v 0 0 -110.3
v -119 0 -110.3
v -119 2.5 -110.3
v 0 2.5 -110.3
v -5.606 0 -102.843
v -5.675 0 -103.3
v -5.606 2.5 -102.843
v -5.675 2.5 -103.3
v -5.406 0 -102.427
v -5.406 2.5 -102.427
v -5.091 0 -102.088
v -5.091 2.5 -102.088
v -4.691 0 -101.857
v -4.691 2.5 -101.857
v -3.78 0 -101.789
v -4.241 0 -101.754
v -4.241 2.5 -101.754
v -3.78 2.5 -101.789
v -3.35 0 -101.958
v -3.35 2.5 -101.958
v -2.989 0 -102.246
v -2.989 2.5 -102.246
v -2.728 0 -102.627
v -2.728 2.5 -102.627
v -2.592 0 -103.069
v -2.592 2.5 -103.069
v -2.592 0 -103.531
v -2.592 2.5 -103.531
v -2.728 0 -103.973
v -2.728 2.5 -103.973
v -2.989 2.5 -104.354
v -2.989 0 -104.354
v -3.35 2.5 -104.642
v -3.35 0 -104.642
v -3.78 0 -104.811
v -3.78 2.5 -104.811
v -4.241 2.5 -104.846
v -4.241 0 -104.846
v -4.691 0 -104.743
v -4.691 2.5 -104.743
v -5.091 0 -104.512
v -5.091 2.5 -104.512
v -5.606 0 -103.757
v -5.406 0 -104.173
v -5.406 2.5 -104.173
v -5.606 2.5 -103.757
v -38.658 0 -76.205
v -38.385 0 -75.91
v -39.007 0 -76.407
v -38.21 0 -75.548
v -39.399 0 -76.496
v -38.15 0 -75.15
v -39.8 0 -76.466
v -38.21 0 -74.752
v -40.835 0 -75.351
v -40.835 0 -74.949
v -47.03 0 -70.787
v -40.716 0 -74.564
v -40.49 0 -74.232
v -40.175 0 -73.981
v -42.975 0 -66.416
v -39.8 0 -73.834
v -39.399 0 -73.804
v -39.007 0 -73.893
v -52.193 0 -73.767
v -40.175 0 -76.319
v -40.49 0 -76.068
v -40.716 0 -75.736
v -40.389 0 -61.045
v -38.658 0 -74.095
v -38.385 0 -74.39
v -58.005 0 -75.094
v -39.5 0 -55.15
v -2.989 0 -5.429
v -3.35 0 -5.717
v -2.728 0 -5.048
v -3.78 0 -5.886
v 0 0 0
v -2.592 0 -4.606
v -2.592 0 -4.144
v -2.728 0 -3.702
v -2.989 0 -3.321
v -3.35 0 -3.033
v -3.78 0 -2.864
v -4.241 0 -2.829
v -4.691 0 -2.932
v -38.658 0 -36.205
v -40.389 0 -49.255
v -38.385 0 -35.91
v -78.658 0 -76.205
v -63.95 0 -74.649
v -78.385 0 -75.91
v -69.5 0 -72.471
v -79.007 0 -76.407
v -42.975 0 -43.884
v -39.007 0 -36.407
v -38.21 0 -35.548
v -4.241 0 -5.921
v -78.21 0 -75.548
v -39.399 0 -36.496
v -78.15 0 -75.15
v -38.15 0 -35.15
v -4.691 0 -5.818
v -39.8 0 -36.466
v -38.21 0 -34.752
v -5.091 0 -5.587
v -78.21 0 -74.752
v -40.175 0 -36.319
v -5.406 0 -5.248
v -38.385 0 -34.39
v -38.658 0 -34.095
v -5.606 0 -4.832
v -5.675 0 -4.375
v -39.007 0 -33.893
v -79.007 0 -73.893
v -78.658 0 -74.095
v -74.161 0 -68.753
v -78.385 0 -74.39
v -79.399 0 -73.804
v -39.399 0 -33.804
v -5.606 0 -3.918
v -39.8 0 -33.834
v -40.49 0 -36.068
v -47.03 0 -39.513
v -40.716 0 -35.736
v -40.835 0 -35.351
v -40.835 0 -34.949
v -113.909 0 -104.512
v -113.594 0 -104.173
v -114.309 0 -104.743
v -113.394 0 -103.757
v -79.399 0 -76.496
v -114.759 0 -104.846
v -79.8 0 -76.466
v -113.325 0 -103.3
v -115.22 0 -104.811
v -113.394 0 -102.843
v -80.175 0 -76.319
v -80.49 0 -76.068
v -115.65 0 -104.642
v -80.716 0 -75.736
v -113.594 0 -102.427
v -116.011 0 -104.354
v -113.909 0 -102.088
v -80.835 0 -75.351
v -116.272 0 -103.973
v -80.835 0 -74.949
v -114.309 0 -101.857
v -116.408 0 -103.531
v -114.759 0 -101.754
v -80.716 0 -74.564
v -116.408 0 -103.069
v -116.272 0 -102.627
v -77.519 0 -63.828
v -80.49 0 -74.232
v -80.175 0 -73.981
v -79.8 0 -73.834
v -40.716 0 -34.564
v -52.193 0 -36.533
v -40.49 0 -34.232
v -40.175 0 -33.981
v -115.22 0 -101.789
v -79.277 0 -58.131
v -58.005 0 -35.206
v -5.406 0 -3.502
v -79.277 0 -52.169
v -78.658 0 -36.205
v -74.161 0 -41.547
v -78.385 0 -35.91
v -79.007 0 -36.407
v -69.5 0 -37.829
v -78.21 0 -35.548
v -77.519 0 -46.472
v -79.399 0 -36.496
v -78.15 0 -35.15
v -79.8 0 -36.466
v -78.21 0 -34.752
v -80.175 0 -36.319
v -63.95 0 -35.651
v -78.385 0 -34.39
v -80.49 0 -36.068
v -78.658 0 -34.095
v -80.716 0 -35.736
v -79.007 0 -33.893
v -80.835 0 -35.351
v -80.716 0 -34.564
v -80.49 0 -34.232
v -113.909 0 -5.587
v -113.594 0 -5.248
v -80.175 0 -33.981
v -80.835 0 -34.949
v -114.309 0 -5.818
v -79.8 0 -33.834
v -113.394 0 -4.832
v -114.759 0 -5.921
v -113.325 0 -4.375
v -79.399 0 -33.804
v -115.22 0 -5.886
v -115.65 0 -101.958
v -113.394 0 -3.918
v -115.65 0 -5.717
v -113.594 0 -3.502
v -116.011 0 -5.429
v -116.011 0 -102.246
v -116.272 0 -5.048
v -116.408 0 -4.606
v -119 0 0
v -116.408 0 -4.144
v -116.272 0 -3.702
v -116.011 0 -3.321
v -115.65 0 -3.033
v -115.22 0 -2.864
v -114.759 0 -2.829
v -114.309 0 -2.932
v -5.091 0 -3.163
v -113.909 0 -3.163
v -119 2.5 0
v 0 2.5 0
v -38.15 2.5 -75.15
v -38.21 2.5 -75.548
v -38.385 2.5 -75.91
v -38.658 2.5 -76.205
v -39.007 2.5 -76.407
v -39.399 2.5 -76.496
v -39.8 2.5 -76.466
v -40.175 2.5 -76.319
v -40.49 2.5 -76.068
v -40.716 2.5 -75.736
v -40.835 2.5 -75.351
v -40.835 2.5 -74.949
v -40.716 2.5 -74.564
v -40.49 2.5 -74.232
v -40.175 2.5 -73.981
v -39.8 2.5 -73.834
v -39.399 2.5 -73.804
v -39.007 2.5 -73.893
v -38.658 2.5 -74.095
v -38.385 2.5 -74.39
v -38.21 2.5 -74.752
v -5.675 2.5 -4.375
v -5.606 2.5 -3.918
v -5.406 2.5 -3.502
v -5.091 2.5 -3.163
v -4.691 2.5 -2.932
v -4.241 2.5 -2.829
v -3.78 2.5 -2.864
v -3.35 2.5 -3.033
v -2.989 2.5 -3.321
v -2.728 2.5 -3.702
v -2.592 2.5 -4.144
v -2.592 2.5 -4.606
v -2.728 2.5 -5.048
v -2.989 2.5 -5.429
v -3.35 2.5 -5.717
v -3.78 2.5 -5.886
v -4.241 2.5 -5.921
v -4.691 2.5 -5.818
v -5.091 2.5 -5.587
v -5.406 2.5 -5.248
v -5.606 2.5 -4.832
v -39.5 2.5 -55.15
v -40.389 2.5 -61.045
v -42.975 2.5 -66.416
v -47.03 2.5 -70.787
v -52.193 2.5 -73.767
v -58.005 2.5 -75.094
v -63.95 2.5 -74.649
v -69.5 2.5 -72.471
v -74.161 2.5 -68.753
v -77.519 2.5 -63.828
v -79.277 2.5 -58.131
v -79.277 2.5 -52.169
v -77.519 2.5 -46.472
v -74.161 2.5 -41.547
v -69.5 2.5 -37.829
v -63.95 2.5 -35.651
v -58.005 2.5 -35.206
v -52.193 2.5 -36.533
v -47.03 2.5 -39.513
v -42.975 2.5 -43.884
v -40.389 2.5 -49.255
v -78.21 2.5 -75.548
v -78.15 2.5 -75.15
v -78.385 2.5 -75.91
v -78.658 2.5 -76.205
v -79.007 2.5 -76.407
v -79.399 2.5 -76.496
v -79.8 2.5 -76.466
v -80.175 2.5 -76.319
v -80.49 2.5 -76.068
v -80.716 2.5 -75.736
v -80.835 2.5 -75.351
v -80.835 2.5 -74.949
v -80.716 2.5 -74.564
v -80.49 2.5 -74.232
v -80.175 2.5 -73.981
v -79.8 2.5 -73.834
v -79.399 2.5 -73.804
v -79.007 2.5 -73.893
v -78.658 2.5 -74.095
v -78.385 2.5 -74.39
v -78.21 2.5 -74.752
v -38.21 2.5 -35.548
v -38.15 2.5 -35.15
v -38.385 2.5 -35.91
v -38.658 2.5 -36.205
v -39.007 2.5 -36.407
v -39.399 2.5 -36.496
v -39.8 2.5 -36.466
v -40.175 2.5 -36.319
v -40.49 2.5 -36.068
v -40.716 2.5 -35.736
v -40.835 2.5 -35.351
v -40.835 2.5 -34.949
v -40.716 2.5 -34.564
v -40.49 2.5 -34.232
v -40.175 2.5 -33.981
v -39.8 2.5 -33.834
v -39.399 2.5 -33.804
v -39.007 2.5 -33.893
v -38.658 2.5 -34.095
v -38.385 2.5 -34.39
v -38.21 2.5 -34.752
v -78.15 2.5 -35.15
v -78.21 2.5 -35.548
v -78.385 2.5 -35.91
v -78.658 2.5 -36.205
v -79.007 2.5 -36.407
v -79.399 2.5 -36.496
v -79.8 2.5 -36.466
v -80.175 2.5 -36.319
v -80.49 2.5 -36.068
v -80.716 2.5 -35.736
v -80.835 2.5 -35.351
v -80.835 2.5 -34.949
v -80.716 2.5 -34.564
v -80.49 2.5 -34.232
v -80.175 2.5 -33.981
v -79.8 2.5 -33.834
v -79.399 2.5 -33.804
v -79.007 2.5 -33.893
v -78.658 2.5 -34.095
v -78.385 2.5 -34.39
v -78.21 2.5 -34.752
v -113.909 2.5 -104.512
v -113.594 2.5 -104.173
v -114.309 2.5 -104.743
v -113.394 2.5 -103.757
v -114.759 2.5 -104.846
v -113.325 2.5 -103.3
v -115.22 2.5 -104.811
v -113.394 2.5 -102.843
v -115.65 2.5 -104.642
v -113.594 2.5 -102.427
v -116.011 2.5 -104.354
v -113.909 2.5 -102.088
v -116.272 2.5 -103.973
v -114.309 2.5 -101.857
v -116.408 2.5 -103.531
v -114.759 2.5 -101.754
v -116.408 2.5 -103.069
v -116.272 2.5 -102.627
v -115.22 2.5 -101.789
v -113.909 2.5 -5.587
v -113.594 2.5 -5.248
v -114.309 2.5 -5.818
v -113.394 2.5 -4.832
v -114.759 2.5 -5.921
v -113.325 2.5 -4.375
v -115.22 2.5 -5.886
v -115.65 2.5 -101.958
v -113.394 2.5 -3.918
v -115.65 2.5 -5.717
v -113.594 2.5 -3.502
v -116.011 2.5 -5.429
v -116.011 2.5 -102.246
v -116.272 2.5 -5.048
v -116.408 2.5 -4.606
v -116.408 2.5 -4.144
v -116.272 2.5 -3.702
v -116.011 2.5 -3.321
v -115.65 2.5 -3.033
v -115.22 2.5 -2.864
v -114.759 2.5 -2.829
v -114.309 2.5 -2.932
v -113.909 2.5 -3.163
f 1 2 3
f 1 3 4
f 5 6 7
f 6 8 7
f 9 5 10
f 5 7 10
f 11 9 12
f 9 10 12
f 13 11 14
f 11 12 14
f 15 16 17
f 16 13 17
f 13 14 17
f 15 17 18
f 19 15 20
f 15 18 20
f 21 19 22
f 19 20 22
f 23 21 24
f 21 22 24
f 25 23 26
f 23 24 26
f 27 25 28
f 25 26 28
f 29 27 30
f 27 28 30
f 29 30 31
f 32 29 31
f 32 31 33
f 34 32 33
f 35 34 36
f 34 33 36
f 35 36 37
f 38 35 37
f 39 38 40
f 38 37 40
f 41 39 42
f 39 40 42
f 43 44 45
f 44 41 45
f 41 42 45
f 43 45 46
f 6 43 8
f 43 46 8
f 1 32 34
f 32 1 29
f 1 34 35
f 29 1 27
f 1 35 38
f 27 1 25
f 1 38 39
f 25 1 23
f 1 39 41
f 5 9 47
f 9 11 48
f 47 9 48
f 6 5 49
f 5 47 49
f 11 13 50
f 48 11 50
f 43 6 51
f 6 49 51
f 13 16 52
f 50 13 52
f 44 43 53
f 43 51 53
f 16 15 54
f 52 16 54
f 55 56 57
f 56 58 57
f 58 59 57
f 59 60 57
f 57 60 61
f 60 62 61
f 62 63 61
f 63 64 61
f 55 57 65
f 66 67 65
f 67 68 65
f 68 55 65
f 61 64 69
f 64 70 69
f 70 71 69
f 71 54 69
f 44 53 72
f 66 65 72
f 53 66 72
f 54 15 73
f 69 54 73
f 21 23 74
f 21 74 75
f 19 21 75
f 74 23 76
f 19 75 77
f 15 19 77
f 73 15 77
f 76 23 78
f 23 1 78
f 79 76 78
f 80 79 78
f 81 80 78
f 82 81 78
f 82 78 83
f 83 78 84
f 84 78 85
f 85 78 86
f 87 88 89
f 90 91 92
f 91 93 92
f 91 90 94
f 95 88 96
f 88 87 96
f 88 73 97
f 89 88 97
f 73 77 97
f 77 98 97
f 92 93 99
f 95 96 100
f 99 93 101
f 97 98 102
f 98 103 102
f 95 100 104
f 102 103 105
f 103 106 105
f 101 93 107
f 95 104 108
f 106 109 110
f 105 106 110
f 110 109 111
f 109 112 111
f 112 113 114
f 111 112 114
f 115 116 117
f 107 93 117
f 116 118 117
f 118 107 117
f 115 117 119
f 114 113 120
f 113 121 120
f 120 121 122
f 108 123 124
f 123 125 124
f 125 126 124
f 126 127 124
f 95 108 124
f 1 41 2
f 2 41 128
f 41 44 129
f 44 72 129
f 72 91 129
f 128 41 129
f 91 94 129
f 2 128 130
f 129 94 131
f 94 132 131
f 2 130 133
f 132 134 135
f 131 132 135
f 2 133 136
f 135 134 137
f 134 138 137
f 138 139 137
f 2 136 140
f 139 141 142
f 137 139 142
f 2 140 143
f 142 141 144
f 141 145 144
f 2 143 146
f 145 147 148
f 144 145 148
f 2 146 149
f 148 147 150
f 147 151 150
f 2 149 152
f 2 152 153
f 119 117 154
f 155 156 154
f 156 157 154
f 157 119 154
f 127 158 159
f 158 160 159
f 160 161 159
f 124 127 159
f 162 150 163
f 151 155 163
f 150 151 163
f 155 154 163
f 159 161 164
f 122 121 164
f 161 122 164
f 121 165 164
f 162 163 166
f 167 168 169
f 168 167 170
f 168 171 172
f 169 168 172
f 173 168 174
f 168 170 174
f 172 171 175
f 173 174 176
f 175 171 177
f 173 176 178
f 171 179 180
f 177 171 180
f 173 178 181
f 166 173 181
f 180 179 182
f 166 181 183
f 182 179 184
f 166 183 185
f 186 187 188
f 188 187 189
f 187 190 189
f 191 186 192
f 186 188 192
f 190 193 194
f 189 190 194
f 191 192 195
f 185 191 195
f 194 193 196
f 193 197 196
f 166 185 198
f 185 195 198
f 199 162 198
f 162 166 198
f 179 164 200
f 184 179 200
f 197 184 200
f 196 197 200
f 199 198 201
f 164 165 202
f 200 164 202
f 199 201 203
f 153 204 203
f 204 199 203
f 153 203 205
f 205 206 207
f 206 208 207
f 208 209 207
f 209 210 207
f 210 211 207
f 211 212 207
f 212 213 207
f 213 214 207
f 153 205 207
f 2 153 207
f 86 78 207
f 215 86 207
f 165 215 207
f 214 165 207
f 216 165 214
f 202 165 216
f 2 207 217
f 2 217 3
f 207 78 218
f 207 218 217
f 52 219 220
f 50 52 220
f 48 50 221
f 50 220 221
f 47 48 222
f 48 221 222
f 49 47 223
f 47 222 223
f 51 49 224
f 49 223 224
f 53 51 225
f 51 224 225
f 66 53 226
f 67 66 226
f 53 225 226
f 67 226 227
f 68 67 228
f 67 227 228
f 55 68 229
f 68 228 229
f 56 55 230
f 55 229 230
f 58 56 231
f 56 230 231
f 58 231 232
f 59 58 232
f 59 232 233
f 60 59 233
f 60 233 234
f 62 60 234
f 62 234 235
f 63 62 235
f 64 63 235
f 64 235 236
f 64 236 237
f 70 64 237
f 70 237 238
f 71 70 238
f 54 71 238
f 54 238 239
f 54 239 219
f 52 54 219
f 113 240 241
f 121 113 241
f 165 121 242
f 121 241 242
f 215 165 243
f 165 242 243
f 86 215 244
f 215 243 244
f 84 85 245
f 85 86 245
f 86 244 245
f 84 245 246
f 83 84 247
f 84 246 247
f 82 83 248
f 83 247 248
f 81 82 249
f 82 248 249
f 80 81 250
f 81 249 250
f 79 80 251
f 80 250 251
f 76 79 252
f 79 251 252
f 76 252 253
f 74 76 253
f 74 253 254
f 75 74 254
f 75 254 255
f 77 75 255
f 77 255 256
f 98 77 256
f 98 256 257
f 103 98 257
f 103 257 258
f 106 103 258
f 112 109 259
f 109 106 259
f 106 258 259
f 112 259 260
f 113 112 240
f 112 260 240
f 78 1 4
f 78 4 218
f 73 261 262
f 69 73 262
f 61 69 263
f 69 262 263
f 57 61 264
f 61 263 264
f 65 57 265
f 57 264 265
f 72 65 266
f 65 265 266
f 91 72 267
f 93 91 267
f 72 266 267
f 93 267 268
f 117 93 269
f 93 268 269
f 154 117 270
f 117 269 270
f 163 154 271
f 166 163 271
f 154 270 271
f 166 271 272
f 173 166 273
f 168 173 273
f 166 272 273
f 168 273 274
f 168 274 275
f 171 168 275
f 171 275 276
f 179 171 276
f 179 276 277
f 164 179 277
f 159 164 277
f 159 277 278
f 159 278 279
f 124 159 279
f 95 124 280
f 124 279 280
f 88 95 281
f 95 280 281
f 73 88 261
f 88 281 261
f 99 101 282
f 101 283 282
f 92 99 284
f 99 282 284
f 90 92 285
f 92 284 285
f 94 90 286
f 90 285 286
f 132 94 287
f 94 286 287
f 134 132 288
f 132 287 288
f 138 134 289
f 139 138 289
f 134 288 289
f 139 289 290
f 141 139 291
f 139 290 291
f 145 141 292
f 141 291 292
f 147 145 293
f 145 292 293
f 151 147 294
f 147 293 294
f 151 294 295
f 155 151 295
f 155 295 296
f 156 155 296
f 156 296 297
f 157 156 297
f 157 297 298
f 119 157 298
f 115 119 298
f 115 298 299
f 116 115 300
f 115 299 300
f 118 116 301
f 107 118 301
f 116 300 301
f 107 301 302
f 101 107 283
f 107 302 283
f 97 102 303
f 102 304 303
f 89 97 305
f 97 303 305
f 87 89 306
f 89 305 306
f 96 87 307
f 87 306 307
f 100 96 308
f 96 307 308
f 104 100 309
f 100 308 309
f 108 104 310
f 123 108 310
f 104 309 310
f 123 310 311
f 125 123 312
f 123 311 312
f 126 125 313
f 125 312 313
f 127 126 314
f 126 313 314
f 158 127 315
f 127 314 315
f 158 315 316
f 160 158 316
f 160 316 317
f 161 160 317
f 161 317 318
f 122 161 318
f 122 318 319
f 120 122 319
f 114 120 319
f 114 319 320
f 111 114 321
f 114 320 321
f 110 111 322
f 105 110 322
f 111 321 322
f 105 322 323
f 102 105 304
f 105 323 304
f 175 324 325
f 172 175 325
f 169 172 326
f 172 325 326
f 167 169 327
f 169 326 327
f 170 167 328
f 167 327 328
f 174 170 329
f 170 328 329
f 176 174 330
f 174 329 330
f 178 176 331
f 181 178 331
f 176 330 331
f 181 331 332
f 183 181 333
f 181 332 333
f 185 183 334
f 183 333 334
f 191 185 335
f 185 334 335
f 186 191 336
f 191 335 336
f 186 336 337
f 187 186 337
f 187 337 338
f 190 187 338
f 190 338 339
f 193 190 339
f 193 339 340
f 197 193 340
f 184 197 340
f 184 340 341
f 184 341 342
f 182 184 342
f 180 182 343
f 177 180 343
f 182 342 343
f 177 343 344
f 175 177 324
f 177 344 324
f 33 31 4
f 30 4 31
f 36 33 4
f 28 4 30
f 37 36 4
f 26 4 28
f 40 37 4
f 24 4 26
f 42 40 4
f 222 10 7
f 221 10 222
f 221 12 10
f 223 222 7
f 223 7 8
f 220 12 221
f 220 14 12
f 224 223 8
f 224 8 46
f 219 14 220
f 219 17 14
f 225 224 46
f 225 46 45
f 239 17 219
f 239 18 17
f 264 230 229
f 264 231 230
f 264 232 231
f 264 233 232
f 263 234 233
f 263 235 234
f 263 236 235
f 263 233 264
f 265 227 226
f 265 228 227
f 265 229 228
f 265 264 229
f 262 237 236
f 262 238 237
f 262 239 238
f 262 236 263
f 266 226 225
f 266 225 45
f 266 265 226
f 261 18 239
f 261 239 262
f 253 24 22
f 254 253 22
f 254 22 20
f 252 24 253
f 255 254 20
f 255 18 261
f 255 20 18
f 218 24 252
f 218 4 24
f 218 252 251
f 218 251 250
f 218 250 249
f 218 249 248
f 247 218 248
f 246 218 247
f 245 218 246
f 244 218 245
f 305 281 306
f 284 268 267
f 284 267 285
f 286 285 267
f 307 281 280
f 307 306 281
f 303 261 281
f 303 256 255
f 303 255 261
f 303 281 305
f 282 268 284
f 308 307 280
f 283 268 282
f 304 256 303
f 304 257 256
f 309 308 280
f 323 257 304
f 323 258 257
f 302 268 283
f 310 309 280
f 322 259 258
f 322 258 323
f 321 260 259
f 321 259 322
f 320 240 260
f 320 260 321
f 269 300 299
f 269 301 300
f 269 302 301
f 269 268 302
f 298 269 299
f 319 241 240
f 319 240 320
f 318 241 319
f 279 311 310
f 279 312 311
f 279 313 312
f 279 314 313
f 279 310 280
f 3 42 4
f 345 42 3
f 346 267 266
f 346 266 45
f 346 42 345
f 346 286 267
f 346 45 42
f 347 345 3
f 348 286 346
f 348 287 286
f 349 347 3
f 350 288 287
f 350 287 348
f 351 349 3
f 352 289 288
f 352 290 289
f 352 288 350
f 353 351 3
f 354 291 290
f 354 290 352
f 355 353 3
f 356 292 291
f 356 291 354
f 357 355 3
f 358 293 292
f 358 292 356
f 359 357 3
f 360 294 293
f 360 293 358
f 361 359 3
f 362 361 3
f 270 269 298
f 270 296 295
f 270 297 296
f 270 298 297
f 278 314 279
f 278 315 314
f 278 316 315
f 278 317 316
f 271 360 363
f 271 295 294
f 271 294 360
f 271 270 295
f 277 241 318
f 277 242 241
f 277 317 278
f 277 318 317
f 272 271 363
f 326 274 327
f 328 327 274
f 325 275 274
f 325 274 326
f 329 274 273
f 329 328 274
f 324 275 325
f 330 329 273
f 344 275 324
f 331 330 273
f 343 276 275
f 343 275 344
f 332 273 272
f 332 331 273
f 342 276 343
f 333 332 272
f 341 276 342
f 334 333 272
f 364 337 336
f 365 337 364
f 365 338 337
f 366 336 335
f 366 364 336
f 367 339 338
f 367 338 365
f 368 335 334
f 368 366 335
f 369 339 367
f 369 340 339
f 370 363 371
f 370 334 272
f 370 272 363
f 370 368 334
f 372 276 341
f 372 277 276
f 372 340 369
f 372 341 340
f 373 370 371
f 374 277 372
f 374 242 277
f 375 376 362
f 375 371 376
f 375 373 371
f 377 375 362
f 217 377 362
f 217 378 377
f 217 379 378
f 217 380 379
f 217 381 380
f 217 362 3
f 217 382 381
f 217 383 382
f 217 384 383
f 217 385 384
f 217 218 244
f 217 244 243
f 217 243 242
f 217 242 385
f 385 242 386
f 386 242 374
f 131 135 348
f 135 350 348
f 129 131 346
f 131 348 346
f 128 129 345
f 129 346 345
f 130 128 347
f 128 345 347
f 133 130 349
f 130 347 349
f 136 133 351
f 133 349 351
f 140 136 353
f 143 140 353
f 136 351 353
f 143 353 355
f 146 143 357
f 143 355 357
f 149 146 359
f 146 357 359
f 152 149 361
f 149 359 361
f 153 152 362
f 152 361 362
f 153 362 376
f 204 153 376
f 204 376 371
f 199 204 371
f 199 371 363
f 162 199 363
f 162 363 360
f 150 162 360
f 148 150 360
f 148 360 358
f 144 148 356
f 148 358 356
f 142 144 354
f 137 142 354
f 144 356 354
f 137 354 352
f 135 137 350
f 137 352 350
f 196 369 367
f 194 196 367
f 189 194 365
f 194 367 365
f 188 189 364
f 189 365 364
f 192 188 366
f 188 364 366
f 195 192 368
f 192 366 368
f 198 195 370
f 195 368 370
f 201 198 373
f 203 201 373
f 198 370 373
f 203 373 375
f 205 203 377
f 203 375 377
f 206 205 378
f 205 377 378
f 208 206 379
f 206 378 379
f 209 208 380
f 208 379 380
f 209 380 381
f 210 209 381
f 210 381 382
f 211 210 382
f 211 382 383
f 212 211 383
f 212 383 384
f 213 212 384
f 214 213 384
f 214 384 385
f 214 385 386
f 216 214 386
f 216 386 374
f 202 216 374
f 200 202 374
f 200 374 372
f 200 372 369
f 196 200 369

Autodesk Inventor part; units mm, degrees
ref_plane "YZ Plane" through (0, 0, 0) normal (1, 0, 0) x (0, 1, 0)
ref_plane "XZ Plane" through (0, 0, 0) normal (0, 1, 0) x (-1, 0, 0)
sketch "Sketch1" plane through (0, 0, 0) normal (0, 1, 0) x (-1, 0, 0)
  line L0 (0, 0) -> (119, 0)
  line L1 (119, 0) -> (119, -110.3)
  line L2 (119, -110.3) -> (0, -110.3)
  line L3 (0, -110.3) -> (0, 0)
  dimension "d0" = 119
  dimension "d1" = 110.3
extrude "Extrusion1" add sketch "Sketch1" along normal blind 2.5
sketch "Sketch2" plane through (0, 2.5, 0) normal (0, 1, 0) x (1, 0, 0)
  line L0 (-119, 0) -> (0, 0) projected
  line L1 (0, 0) -> (0, 110.3) projected
  line L2 (0, 110.3) -> (-119, 110.3) projected
  line L3 (-119, 110.3) -> (-119, 0) projected
  circle A0 centre (-114.875, 4.375) radius 1.55
  circle A1 centre (-114.875, 103.3) radius 1.55
  dimension "d4" = 3.1
  dimension "d5" = 4.125
  dimension "d6" = 4.375
  dimension "d7" = 3.1
  dimension "d8" = 7
extrude "Extrusion2" cut sketch "Sketch2" against normal blind 2.5 contours A0 | A1
ref_plane "Work Plane1" through (-59.5, 0, 0) normal (1, 0, 0) x (0, 0, -1)
mirror "Mirror1" about plane through (-59.5, 0, 0) normal (1, 0, 0) of "Extrusion2"
sketch "Sketch3" plane through (0, 2.5, 0) normal (0, 1, 0) x (1, 0, 0)
  circle A0 centre (-4.125, 4.375) radius 1.55 projected
  circle A1 centre (-4.125, 103.3) radius 1.55 projected
  circle A2 centre (-114.875, 4.375) radius 1.55 projected
  circle A3 centre (-114.875, 103.3) radius 1.55 projected
  line L0 (-119, 0) -> (0, 0) projected
  line L1 (0, 0) -> (0, 110.3) projected
  line L2 (0, 110.3) -> (-119, 110.3) projected
  line L3 (-119, 110.3) -> (-119, 0) projected
  circle A4 centre (-59.5, 55.15) radius 20
  circle A5 centre (-39.5, 35.15) radius 1.35
  circle A6 centre (-79.5, 35.15) radius 1.35
  circle A7 centre (-79.5, 75.15) radius 1.35
  circle A8 centre (-39.5, 75.15) radius 1.35
  dimension "d16" = 2.7
  dimension "d17" = 2.7
  dimension "d18" = 2.7
  dimension "d19" = 2.7
extrude "Extrusion3" cut sketch "Sketch3" against normal blind 2.5 contours A4 | A5 | A6 | A7 | A8
properties part number "Base Cover Right"
